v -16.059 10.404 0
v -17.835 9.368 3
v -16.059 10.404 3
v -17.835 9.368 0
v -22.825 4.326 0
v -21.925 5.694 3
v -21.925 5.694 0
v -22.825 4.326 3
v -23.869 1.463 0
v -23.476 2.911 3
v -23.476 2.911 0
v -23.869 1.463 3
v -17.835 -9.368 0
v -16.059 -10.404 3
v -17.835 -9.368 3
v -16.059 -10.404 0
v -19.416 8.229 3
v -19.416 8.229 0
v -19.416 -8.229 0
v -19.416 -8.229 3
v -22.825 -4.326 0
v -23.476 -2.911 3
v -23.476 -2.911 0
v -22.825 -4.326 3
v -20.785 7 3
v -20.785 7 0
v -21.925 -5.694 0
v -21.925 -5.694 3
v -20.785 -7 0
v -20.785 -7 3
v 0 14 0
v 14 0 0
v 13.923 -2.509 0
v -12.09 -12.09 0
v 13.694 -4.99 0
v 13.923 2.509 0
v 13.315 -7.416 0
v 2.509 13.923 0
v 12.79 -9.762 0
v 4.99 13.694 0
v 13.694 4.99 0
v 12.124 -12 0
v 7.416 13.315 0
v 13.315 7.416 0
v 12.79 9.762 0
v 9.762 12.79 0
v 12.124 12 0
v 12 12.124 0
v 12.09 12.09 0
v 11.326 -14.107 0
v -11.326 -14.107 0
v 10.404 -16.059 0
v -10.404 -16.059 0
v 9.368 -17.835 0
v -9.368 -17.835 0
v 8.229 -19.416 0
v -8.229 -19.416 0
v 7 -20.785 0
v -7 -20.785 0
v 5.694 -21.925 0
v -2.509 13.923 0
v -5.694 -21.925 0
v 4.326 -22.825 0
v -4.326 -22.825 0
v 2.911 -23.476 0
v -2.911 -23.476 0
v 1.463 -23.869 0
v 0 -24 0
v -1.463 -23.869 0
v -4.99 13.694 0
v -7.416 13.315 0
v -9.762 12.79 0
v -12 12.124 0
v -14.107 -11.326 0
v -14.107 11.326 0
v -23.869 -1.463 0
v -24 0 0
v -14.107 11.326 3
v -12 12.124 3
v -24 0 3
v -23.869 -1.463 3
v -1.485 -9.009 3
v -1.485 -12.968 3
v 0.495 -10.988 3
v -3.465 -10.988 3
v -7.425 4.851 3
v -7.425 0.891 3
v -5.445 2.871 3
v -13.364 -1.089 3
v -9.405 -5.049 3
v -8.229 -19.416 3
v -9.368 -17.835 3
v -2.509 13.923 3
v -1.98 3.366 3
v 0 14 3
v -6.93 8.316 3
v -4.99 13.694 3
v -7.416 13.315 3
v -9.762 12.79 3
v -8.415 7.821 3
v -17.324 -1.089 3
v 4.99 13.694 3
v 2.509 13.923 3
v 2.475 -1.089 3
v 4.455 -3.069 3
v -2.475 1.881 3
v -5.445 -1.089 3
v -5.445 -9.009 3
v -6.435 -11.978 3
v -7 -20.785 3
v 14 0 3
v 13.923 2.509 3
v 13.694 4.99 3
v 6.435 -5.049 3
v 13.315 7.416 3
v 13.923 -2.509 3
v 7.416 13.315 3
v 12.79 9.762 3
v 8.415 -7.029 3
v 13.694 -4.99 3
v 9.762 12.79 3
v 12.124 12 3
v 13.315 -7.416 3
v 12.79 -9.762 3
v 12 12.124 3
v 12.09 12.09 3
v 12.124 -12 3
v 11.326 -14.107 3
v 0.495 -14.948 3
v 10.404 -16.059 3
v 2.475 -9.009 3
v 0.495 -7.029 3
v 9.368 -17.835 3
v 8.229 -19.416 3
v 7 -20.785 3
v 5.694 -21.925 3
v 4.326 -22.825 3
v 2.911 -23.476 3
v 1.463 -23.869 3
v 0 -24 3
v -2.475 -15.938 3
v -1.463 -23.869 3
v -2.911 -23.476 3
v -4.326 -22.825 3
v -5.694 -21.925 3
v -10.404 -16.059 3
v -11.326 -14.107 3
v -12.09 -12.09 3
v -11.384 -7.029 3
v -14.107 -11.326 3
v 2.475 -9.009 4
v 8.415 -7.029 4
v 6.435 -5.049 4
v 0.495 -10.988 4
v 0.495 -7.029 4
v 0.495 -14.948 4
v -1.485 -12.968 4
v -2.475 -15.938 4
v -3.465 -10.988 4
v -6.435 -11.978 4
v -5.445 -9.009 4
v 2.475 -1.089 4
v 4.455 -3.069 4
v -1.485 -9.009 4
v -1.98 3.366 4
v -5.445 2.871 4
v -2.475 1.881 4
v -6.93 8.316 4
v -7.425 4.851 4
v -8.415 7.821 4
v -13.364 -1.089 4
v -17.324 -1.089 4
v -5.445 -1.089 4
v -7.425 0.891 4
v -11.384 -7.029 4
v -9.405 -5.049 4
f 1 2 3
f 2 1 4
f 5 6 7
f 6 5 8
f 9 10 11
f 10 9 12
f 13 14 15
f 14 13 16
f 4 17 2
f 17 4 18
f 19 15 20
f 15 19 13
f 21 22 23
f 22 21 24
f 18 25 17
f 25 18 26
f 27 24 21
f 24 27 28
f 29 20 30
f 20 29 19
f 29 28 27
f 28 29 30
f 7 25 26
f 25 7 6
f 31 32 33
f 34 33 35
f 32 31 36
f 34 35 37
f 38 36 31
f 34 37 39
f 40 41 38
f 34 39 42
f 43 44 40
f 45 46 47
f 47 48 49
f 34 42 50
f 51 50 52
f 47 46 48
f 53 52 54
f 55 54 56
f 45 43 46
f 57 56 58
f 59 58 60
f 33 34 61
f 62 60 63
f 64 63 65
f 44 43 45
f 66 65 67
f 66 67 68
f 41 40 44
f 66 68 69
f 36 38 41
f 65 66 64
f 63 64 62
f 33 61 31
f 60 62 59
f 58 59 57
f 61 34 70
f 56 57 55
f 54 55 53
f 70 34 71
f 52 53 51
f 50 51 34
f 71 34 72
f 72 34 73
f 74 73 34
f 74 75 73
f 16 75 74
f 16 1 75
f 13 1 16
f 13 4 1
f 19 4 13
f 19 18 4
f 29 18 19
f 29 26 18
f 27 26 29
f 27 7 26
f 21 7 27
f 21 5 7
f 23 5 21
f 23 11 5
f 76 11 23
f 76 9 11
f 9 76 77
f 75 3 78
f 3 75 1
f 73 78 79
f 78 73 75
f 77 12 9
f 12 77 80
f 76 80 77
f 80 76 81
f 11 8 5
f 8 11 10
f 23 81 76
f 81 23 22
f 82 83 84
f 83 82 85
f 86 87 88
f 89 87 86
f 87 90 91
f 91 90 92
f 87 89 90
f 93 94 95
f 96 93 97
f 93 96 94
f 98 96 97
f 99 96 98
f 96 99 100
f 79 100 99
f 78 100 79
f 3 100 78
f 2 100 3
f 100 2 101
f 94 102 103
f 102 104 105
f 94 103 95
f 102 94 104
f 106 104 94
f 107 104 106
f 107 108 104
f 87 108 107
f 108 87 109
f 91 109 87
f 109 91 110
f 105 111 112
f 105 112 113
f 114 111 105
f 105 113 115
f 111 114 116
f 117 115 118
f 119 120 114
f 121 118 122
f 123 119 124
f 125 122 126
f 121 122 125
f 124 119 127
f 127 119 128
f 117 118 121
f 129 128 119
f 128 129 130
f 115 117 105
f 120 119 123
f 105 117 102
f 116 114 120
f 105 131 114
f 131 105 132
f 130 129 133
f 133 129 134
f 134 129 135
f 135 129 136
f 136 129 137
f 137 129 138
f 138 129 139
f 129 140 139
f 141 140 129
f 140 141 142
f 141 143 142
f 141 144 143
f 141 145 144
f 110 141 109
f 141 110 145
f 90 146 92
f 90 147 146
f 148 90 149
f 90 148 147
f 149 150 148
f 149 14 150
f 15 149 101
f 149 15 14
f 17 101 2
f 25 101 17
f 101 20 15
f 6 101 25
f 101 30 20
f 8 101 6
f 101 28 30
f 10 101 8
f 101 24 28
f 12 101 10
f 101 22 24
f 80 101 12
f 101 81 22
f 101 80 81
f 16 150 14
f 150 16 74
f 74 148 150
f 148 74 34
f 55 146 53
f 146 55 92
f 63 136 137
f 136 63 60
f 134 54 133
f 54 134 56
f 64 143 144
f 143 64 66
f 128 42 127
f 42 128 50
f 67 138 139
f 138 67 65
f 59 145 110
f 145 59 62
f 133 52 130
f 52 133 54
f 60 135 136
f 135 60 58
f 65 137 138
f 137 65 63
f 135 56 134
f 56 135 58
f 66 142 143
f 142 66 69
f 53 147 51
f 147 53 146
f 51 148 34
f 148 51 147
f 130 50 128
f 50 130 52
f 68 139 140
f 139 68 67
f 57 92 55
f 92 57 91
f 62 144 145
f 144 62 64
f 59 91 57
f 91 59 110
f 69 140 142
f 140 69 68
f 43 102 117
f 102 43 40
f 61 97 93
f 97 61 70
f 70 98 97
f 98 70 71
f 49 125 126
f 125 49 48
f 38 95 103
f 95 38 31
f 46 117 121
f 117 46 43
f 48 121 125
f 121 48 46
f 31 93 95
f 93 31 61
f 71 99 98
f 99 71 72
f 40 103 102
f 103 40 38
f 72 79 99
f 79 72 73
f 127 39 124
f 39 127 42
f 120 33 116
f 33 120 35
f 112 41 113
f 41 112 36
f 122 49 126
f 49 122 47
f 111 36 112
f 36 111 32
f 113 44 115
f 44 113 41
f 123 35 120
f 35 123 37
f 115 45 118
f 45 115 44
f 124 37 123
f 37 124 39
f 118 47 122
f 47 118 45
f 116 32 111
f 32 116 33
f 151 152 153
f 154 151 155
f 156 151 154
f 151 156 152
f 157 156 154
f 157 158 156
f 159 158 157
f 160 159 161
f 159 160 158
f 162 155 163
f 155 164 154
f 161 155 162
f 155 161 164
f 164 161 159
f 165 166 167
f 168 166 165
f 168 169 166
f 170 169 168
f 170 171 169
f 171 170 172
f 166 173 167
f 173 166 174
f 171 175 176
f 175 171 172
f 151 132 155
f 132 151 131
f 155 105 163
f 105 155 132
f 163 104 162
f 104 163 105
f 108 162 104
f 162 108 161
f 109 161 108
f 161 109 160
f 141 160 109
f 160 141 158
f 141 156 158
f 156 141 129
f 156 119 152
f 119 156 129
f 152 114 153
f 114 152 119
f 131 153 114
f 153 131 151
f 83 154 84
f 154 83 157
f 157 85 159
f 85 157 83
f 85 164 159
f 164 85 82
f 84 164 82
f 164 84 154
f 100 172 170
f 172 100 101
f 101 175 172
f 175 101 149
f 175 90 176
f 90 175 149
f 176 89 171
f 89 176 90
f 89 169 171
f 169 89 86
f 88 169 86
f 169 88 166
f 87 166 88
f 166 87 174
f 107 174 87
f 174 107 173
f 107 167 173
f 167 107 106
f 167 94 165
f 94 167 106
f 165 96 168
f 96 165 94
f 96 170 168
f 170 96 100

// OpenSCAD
// [FL_INDEX: keywords="openscad, 3d_parametric, Initialed_Heart_Ornament, csg_solid" | COT="Parametric OpenSCAD design from 3DCodeverse"]
// Title: Initialed Heart Ornament

// Initialed Heart Ornament
// By Jake Poznanski
// preview[view:north east, tilt:top]

//Enter your two letter initials
initials = "AJ"; 

//The height of the main heart body in mm
height = 3; // [3:10]

//The height of the letters themselves
letter_height = 1; // [1:5]

//Internal variables
heartAngle = 90*1;
size = 14*1;
ratio = 48/28;
elipseSize = [size * ratio,size,height];

//Importing this module directly for Makerbot customizer script
// Spiff Sans
// Author: Stuart P. Bentley <stuart@testtrack4.com>

module spiffsans_puts(letters, count, offsets)
{
  for(i=[0:count-1])
  {
    translate([offsets[i],0,0])
    {
      spiffsans_lookup_draw(letters[i]);
    }
  }
}

module spiffsans_lookup_draw(char)
{
  if(char==" ") {} //silly lookup, space can't be printed
  else if(char =="!") spiffsans_exclaim();
  else if(char =="-") spiffsans_hyphen();
  else if(char ==".") spiffsans_period();
  else if(char =="0") spiffsans_digit_0();
  else if(char =="1") spiffsans_digit_1();
  else if(char =="2") spiffsans_digit_2();
  else if(char =="3") spiffsans_digit_3();
  else if(char =="4") spiffsans_digit_4();
  else if(char =="5") spiffsans_digit_5();
  else if(char =="6") spiffsans_digit_6();
  else if(char =="7") spiffsans_digit_7();
  else if(char =="8") spiffsans_digit_8();
  else if(char =="9") spiffsans_digit_9();
  else if(char ==":") spiffsans_colon();
  else if(char =="?") spiffsans_question();
  else if(char =="A" || char == "a") spiffsans_capital_a();
  else if(char =="B" || char == "b") spiffsans_capital_b();
  else if(char =="C" || char == "c") spiffsans_capital_c();
  else if(char =="D" || char == "d") spiffsans_capital_d();
  else if(char =="E" || char == "e") spiffsans_capital_e();
  else if(char =="F" || char == "f") spiffsans_capital_f();
  else if(char =="G" || char == "g") spiffsans_capital_g();
  else if(char =="H" || char == "h") spiffsans_capital_h();
  else if(char =="I" || char == "i") spiffsans_capital_i();
  else if(char =="J" || char == "j") spiffsans_capital_j();
  else if(char =="K" || char == "k") spiffsans_capital_k();
  else if(char =="L" || char == "l") spiffsans_capital_l();
  else if(char =="M" || char == "m") spiffsans_capital_m();
  else if(char =="N" || char == "n") spiffsans_capital_n();
  else if(char =="O" || char == "o") spiffsans_capital_o();
  else if(char =="P" || char == "p") spiffsans_capital_p();
  else if(char =="Q" || char == "q") spiffsans_capital_q();
  else if(char =="R" || char == "r") spiffsans_capital_r();
  else if(char =="S" || char == "s") spiffsans_capital_s();
  else if(char =="T" || char == "t") spiffsans_capital_t();
  else if(char =="U" || char == "u") spiffsans_capital_u();
  else if(char =="V" || char == "v") spiffsans_capital_v();
  else if(char =="W" || char == "w") spiffsans_capital_w();
  else if(char =="X" || char == "x") spiffsans_capital_x();
  else if(char =="Y" || char == "y") spiffsans_capital_y();
  else if(char =="Z" || char == "z") spiffsans_capital_z();
  else echo(str("Unknown character: ", char));
}

module spiffsans_exclaim()
{
  polygon(points=[[0,3],[0,10],[2,10],[2,3],[0,0],[0,2],[2,2],[2,0]],paths=[[0,1,2,3],[4,5,6,7]]);
}

module spiffsans_hyphen()
{
  polygon(points=[[0,4],[0,6],[4,6],[4,4]],paths=[[0,1,2,3]]);
}

module spiffsans_period()
{
  polygon(points=[[0,0],[0,2],[2,2],[2,0]],paths=[[0,1,2,3]]);
}

module spiffsans_digit_0()
{
  polygon(points=[[5,0],[1,0],[0,2],[0,8],[1,10],[5,10],[6,8],[6,2],[2,8],[4,8],[2,5],[2,2],[4,5],[4,2]],paths=[[0,1,2,3,4,5,6,7],[8,9,10],[11,12,13]]);
}

module spiffsans_digit_1()
{
  polygon(points=[[0,0],[0,2],[2,2],[2,7],[0,7],[2,10],[4,10],[4,2],[5,2],[5,0]],paths=[[0,1,2,3,4,5,6,7,8,9]]);
}

module spiffsans_digit_2()
{
  polygon(points=[[0,0],[0,2],[4,6],[4,8],[2,8],[2,6],[0,6],[0,8],[1,10],[5,10],[6,8],[6,5.5],[2.5,2],[6,2],[6,0]],paths=[[0,1,2,3,4,5,6,7,8,9,10,11,12,13,14]]);
}

module spiffsans_digit_3()
{
  polygon(points=[[1,0],[0,2],[0,4],[2,4],[2,2],[4,2],[4,4],[3,4],[3,6],[4,6],[4,8],[2,8],[2,6],[0,6],[0,8],[1,10],[5,10],[6,8],[6,6],[5.5,5],[6,4],[6,2],[5,0]],paths=[[0,1,2,3,4,5,6,7,8,9,10,11,12,13,14,15,16,17,18,19,20,21,22]]);
}

module spiffsans_digit_4()
{
  polygon(points=[[4,0],[4,4],[0,4],[0,10],[2,10],[2,6],[4,6],[4,10],[6,10],[6,0]],paths=[[0,1,2,3,4,5,6,7,8,9]]);
}

module spiffsans_digit_5()
{
  polygon(points=[[0,0],[0,2],[4,2],[4.5,3],[4,4],[0,4],[0,10],[6,10],[6,8],[2,8],[2,6],[5,6],[6,4],[6,2],[5,0]],paths=[[0,1,2,3,4,5,6,7,8,9,10,11,12,13,14]]);
}

module spiffsans_digit_6()
{
  polygon(points=[[1,0],[0,2],[0,8],[1,10],[5,10],[5.5,8],[2,8],[2,6],[5,6],[6,4],[6,2],[5,0],[2,2],[2,4],[4,4],[4,2]],paths=[[0,1,2,3,4,5,6,7,8,9,10,11],[12,13,14,15]]);
}

module spiffsans_digit_7()
{
  polygon(points=[[1,0],[1,3],[3,8],[0,8],[0,10],[5,10],[5,8],[3,3],[3,0]],paths=[[0,1,2,3,4,5,6,7,8]]);
}

module spiffsans_digit_8()
{
  polygon(points=[[1,0],[0,2],[0,4],[0.5,5],[0,6],[0,8],[1,10],[5,10],[6,8],[6,6],[5.5,5],[6,4],[6,2],[5,0],[2,6],[2,8],[4,8],[4,6],[2,2],[2,4],[4,4],[4,2]],paths=[[0,1,2,3,4,5,6,7,8,9,10,11,12,13],[14,15,16,17],[18,19,20,21]]);
}

module spiffsans_digit_9()
{
  polygon(points=[[1,0],[0,2],[4,2],[4,4],[1,4],[0,6],[0,8],[1,10],[5,10],[6,8],[6,2],[5,0],[2,6],[2,8],[4,8],[4,6]],paths=[[0,1,2,3,4,5,6,7,8,9,10,11],[12,13,14,15]]);
}

module spiffsans_colon()
{
  polygon(points=[[0,6],[0,8],[2,8],[2,6],[0,2],[0,4],[2,4],[2,2]],paths=[[0,1,2,3],[4,5,6,7]]);
}

module spiffsans_question()
{
  polygon(points=[[2,3],[4,6],[4,8],[2,8],[2,6],[0,6],[0,8],[2,10],[4,10],[6,8],[6,6],[4,3],[2,0],[2,2],[4,2],[4,0]],paths=[[0,1,2,3,4,5,6,7,8,9,10,11],[12,13,14,15]]);
}

module spiffsans_capital_a()
{
  polygon(points=[[0,0],[0,8],[1,10],[5,10],[6,8],[6,0],[4,0],[4,4],[2,4],[2,0],[2,6],[2,8],[4,8],[4,6]],paths=[[0,1,2,3,4,5,6,7,8,9],[10,11,12,13]]);
}

module spiffsans_capital_b()
{
  polygon(points=[[0,0],[0,10],[5,10],[6,8],[6,6],[5.5,5],[6,4],[6,2],[5,0],[2,6],[2,8],[4,8],[4,6],[2,2],[2,4],[4,4],[4,2]],paths=[[0,1,2,3,4,5,6,7,8],[9,10,11,12],[13,14,15,16]]);
}

module spiffsans_capital_c()
{
  polygon(points=[[6,0],[1,0],[0,2],[0,8],[1,10],[6,10],[6,8],[2,8],[2,2],[6,2]],paths=[[0,1,2,3,4,5,6,7,8,9]]);
}

module spiffsans_capital_d()
{
  polygon(points=[[0,0],[0,10],[5,10],[6,8],[6,2],[5,0],[2,2],[2,8],[4,8],[4,2]],paths=[[0,1,2,3,4,5],[6,7,8,9]]);
}

module spiffsans_capital_e()
{
  polygon(points=[[0,0],[0,10],[5,10],[5,8],[2,8],[2,6],[4,6],[4,4],[2,4],[2,2],[5,2],[5,0]],paths=[[0,1,2,3,4,5,6,7,8,9,10,11]]);
}

module spiffsans_capital_f()
{
  polygon(points=[[0,0],[0,10],[5,10],[5,8],[2,8],[2,6],[4,6],[4,4],[2,4],[2,0]],paths=[[0,1,2,3,4,5,6,7,8,9]]);
}

module spiffsans_capital_g()
{
  polygon(points=[[6,0],[1,0],[0,2],[0,8],[1,10],[5.5,10],[6,8],[2,8],[2,2],[4,2],[4,6],[6,6]],paths=[[0,1,2,3,4,5,6,7,8,9,10,11]]);
}

module spiffsans_capital_h()
{
  polygon(points=[[0,0],[0,10],[2,10],[2,6],[4,6],[4,10],[6,10],[6,0],[4,0],[4,4],[2,4],[2,0]],paths=[[0,1,2,3,4,5,6,7,8,9,10,11]]);
}

module spiffsans_capital_i()
{
  polygon(points=[[0,0],[0,2],[1.5,2],[1.5,8],[0,8],[0,10],[5,10],[5,8],[3.5,8],[3.5,2],[5,2],[5,0]],paths=[[0,1,2,3,4,5,6,7,8,9,10,11]]);
}

module spiffsans_capital_j()
{
  polygon(points=[[0.5,0],[0,1],[0,4],[2,4],[2,2],[4,2],[4,8],[0,8],[0,10],[6,10],[6,1],[5.5,0]],paths=[[0,1,2,3,4,5,6,7,8,9,10,11]]);
}

module spiffsans_capital_k()
{
  polygon(points=[[0,0],[0,10],[2,10],[2,6],[4,6],[4,10],[6,10],[6,6],[5,5],[6,4],[6,0],[4,0],[4,4],[2,4],[2,0]],paths=[[0,1,2,3,4,5,6,7,8,9,10,11,12,13,14]]);
}

module spiffsans_capital_l()
{
  polygon(points=[[0,0],[0,10],[2,10],[2,2],[5,2],[5,0]],paths=[[0,1,2,3,4,5]]);
}

module spiffsans_capital_m()
{
  polygon(points=[[0,0],[0,8],[1,10],[9,10],[10,8],[10,0],[8,0],[8,8],[6,8],[6,0],[4,0],[4,8],[2,8],[2,0]],paths=[[0,1,2,3,4,5,6,7,8,9,10,11,12,13]]);
}

module spiffsans_capital_n()
{
  polygon(points=[[0,0],[0,8],[1,10],[5,10],[6,8],[6,0],[4,0],[4,8],[2,8],[2,0]],paths=[[0,1,2,3,4,5,6,7,8,9]]);
}

module spiffsans_capital_o()
{
  polygon(points=[[5,0],[1,0],[0,2],[0,8],[1,10],[5,10],[6,8],[6,2],[2,2],[2,8],[4,8],[4,2]],paths=[[0,1,2,3,4,5,6,7],[8,9,10,11]]);
}

module spiffsans_capital_p()
{
  polygon(points=[[0,0],[0,10],[5,10],[6,8],[6,6],[5,4],[2,4],[2,0],[2,6],[2,8],[4,8],[4,6]],paths=[[0,1,2,3,4,5,6,7],[8,9,10,11]]);
}

module spiffsans_capital_q()
{
  polygon(points=[[1,0],[0,2],[0,8],[1,10],[5,10],[6,8],[6,0],[2,2],[2,8],[4,8],[4,2]],paths=[[0,1,2,3,4,5,6],[7,8,9,10]]);
}

module spiffsans_capital_r()
{
  polygon(points=[[0,0],[0,10],[5,10],[6,8],[6,6],[5.5,5],[6,4],[6,0],[4,0],[4,4],[2,4],[2,0],[2,6],[2,8],[4,8],[4,6]],paths=[[0,1,2,3,4,5,6,7,8,9,10,11],[12,13,14,15]]);
}

module spiffsans_capital_s()
{
  polygon(points=[[1,0],[0,2],[0,3],[2,3],[2,2],[4,2],[4,4],[1,4],[0,5],[0,8],[1,10],[5,10],[6,8],[6,7],[4,7],[4,8],[2,8],[2,6],[5,6],[6,5],[6,2],[5,0]],paths=[[0,1,2,3,4,5,6,7,8,9,10,11,12,13,14,15,16,17,18,19,20,21]]);
}

module spiffsans_capital_t()
{
  polygon(points=[[2,0],[2,8],[0,8],[0,10],[6,10],[6,8],[4,8],[4,0]],paths=[[0,1,2,3,4,5,6,7]]);
}

module spiffsans_capital_u()
{
  polygon(points=[[1,0],[0,2],[0,10],[2,10],[2,2],[4,2],[4,10],[6,10],[6,2],[5,0]],paths=[[0,1,2,3,4,5,6,7,8,9]]);
}

module spiffsans_capital_v()
{
  polygon(points=[[2,0],[0,4],[0,10],[2,10],[2,4],[4,4],[4,10],[6,10],[6,4],[4,0]],paths=[[0,1,2,3,4,5,6,7,8,9]]);
}

module spiffsans_capital_w()
{
  polygon(points=[[9,0],[1,0],[0,2],[0,10],[2,10],[2,2],[4,2],[4,10],[6,10],[6,2],[8,2],[8,10],[10,10],[10,2]],paths=[[0,1,2,3,4,5,6,7,8,9,10,11,12,13]]);
}

module spiffsans_capital_x()
{
  polygon(points=[[0,0],[0,4],[1,5],[0,6],[0,10],[2,10],[2,6],[4,6],[4,10],[6,10],[6,6],[5,5],[6,4],[6,0],[4,0],[4,4],[2,4],[2,0]],paths=[[0,1,2,3,4,5,6,7,8,9,10,11,12,13,14,15,16,17]]);
}

module spiffsans_capital_y()
{
  polygon(points=[[2,0],[2,4],[1,4],[0,6],[0,10],[2,10],[2,6],[4,6],[4,10],[6,10],[6,6],[5,4],[4,4],[4,0]],paths=[[0,1,2,3,4,5,6,7,8,9,10,11,12,13]]);
}

module spiffsans_capital_z()
{
  polygon(points=[[0,0],[0,2],[3,8],[0,8],[0,10],[5,10],[5,8],[2,2],[5,2],[5,0]],paths=[[0,1,2,3,4,5,6,7,8,9]]);
}


union()
{

translate([0,0,height])
scale([size/10,size/10,1])
linear_extrude(height=letter_height)
rotate(heartAngle+(90-heartAngle)/2+45)
translate([-2.0*(size/10)-5, -size/20,0])
spiffsans_puts(initials, 2, [0,10]);

union(){
intersection(){

union(){
scale(elipseSize)
cylinder(h = 1, r = 1,$fn=60);

rotate(heartAngle)
scale(elipseSize)
cylinder(h = 1, r = 1,$fn=60);
}

rotate(heartAngle+(90-heartAngle)/2+45)
translate([-elipseSize.x,0,-height/2])
cube(size = elipseSize*2);
}

intersection(){

intersection(){
scale(elipseSize)
cylinder(h = 1, r = 1,$fn=60);

rotate(heartAngle)
scale(elipseSize)
cylinder(h = 1, r = 1,$fn=60);
}

rotate(heartAngle+(90-heartAngle)/2+45)
translate([-elipseSize.x,-elipseSize.x,-height/2])
cube(size = elipseSize*2);
}
}


}
